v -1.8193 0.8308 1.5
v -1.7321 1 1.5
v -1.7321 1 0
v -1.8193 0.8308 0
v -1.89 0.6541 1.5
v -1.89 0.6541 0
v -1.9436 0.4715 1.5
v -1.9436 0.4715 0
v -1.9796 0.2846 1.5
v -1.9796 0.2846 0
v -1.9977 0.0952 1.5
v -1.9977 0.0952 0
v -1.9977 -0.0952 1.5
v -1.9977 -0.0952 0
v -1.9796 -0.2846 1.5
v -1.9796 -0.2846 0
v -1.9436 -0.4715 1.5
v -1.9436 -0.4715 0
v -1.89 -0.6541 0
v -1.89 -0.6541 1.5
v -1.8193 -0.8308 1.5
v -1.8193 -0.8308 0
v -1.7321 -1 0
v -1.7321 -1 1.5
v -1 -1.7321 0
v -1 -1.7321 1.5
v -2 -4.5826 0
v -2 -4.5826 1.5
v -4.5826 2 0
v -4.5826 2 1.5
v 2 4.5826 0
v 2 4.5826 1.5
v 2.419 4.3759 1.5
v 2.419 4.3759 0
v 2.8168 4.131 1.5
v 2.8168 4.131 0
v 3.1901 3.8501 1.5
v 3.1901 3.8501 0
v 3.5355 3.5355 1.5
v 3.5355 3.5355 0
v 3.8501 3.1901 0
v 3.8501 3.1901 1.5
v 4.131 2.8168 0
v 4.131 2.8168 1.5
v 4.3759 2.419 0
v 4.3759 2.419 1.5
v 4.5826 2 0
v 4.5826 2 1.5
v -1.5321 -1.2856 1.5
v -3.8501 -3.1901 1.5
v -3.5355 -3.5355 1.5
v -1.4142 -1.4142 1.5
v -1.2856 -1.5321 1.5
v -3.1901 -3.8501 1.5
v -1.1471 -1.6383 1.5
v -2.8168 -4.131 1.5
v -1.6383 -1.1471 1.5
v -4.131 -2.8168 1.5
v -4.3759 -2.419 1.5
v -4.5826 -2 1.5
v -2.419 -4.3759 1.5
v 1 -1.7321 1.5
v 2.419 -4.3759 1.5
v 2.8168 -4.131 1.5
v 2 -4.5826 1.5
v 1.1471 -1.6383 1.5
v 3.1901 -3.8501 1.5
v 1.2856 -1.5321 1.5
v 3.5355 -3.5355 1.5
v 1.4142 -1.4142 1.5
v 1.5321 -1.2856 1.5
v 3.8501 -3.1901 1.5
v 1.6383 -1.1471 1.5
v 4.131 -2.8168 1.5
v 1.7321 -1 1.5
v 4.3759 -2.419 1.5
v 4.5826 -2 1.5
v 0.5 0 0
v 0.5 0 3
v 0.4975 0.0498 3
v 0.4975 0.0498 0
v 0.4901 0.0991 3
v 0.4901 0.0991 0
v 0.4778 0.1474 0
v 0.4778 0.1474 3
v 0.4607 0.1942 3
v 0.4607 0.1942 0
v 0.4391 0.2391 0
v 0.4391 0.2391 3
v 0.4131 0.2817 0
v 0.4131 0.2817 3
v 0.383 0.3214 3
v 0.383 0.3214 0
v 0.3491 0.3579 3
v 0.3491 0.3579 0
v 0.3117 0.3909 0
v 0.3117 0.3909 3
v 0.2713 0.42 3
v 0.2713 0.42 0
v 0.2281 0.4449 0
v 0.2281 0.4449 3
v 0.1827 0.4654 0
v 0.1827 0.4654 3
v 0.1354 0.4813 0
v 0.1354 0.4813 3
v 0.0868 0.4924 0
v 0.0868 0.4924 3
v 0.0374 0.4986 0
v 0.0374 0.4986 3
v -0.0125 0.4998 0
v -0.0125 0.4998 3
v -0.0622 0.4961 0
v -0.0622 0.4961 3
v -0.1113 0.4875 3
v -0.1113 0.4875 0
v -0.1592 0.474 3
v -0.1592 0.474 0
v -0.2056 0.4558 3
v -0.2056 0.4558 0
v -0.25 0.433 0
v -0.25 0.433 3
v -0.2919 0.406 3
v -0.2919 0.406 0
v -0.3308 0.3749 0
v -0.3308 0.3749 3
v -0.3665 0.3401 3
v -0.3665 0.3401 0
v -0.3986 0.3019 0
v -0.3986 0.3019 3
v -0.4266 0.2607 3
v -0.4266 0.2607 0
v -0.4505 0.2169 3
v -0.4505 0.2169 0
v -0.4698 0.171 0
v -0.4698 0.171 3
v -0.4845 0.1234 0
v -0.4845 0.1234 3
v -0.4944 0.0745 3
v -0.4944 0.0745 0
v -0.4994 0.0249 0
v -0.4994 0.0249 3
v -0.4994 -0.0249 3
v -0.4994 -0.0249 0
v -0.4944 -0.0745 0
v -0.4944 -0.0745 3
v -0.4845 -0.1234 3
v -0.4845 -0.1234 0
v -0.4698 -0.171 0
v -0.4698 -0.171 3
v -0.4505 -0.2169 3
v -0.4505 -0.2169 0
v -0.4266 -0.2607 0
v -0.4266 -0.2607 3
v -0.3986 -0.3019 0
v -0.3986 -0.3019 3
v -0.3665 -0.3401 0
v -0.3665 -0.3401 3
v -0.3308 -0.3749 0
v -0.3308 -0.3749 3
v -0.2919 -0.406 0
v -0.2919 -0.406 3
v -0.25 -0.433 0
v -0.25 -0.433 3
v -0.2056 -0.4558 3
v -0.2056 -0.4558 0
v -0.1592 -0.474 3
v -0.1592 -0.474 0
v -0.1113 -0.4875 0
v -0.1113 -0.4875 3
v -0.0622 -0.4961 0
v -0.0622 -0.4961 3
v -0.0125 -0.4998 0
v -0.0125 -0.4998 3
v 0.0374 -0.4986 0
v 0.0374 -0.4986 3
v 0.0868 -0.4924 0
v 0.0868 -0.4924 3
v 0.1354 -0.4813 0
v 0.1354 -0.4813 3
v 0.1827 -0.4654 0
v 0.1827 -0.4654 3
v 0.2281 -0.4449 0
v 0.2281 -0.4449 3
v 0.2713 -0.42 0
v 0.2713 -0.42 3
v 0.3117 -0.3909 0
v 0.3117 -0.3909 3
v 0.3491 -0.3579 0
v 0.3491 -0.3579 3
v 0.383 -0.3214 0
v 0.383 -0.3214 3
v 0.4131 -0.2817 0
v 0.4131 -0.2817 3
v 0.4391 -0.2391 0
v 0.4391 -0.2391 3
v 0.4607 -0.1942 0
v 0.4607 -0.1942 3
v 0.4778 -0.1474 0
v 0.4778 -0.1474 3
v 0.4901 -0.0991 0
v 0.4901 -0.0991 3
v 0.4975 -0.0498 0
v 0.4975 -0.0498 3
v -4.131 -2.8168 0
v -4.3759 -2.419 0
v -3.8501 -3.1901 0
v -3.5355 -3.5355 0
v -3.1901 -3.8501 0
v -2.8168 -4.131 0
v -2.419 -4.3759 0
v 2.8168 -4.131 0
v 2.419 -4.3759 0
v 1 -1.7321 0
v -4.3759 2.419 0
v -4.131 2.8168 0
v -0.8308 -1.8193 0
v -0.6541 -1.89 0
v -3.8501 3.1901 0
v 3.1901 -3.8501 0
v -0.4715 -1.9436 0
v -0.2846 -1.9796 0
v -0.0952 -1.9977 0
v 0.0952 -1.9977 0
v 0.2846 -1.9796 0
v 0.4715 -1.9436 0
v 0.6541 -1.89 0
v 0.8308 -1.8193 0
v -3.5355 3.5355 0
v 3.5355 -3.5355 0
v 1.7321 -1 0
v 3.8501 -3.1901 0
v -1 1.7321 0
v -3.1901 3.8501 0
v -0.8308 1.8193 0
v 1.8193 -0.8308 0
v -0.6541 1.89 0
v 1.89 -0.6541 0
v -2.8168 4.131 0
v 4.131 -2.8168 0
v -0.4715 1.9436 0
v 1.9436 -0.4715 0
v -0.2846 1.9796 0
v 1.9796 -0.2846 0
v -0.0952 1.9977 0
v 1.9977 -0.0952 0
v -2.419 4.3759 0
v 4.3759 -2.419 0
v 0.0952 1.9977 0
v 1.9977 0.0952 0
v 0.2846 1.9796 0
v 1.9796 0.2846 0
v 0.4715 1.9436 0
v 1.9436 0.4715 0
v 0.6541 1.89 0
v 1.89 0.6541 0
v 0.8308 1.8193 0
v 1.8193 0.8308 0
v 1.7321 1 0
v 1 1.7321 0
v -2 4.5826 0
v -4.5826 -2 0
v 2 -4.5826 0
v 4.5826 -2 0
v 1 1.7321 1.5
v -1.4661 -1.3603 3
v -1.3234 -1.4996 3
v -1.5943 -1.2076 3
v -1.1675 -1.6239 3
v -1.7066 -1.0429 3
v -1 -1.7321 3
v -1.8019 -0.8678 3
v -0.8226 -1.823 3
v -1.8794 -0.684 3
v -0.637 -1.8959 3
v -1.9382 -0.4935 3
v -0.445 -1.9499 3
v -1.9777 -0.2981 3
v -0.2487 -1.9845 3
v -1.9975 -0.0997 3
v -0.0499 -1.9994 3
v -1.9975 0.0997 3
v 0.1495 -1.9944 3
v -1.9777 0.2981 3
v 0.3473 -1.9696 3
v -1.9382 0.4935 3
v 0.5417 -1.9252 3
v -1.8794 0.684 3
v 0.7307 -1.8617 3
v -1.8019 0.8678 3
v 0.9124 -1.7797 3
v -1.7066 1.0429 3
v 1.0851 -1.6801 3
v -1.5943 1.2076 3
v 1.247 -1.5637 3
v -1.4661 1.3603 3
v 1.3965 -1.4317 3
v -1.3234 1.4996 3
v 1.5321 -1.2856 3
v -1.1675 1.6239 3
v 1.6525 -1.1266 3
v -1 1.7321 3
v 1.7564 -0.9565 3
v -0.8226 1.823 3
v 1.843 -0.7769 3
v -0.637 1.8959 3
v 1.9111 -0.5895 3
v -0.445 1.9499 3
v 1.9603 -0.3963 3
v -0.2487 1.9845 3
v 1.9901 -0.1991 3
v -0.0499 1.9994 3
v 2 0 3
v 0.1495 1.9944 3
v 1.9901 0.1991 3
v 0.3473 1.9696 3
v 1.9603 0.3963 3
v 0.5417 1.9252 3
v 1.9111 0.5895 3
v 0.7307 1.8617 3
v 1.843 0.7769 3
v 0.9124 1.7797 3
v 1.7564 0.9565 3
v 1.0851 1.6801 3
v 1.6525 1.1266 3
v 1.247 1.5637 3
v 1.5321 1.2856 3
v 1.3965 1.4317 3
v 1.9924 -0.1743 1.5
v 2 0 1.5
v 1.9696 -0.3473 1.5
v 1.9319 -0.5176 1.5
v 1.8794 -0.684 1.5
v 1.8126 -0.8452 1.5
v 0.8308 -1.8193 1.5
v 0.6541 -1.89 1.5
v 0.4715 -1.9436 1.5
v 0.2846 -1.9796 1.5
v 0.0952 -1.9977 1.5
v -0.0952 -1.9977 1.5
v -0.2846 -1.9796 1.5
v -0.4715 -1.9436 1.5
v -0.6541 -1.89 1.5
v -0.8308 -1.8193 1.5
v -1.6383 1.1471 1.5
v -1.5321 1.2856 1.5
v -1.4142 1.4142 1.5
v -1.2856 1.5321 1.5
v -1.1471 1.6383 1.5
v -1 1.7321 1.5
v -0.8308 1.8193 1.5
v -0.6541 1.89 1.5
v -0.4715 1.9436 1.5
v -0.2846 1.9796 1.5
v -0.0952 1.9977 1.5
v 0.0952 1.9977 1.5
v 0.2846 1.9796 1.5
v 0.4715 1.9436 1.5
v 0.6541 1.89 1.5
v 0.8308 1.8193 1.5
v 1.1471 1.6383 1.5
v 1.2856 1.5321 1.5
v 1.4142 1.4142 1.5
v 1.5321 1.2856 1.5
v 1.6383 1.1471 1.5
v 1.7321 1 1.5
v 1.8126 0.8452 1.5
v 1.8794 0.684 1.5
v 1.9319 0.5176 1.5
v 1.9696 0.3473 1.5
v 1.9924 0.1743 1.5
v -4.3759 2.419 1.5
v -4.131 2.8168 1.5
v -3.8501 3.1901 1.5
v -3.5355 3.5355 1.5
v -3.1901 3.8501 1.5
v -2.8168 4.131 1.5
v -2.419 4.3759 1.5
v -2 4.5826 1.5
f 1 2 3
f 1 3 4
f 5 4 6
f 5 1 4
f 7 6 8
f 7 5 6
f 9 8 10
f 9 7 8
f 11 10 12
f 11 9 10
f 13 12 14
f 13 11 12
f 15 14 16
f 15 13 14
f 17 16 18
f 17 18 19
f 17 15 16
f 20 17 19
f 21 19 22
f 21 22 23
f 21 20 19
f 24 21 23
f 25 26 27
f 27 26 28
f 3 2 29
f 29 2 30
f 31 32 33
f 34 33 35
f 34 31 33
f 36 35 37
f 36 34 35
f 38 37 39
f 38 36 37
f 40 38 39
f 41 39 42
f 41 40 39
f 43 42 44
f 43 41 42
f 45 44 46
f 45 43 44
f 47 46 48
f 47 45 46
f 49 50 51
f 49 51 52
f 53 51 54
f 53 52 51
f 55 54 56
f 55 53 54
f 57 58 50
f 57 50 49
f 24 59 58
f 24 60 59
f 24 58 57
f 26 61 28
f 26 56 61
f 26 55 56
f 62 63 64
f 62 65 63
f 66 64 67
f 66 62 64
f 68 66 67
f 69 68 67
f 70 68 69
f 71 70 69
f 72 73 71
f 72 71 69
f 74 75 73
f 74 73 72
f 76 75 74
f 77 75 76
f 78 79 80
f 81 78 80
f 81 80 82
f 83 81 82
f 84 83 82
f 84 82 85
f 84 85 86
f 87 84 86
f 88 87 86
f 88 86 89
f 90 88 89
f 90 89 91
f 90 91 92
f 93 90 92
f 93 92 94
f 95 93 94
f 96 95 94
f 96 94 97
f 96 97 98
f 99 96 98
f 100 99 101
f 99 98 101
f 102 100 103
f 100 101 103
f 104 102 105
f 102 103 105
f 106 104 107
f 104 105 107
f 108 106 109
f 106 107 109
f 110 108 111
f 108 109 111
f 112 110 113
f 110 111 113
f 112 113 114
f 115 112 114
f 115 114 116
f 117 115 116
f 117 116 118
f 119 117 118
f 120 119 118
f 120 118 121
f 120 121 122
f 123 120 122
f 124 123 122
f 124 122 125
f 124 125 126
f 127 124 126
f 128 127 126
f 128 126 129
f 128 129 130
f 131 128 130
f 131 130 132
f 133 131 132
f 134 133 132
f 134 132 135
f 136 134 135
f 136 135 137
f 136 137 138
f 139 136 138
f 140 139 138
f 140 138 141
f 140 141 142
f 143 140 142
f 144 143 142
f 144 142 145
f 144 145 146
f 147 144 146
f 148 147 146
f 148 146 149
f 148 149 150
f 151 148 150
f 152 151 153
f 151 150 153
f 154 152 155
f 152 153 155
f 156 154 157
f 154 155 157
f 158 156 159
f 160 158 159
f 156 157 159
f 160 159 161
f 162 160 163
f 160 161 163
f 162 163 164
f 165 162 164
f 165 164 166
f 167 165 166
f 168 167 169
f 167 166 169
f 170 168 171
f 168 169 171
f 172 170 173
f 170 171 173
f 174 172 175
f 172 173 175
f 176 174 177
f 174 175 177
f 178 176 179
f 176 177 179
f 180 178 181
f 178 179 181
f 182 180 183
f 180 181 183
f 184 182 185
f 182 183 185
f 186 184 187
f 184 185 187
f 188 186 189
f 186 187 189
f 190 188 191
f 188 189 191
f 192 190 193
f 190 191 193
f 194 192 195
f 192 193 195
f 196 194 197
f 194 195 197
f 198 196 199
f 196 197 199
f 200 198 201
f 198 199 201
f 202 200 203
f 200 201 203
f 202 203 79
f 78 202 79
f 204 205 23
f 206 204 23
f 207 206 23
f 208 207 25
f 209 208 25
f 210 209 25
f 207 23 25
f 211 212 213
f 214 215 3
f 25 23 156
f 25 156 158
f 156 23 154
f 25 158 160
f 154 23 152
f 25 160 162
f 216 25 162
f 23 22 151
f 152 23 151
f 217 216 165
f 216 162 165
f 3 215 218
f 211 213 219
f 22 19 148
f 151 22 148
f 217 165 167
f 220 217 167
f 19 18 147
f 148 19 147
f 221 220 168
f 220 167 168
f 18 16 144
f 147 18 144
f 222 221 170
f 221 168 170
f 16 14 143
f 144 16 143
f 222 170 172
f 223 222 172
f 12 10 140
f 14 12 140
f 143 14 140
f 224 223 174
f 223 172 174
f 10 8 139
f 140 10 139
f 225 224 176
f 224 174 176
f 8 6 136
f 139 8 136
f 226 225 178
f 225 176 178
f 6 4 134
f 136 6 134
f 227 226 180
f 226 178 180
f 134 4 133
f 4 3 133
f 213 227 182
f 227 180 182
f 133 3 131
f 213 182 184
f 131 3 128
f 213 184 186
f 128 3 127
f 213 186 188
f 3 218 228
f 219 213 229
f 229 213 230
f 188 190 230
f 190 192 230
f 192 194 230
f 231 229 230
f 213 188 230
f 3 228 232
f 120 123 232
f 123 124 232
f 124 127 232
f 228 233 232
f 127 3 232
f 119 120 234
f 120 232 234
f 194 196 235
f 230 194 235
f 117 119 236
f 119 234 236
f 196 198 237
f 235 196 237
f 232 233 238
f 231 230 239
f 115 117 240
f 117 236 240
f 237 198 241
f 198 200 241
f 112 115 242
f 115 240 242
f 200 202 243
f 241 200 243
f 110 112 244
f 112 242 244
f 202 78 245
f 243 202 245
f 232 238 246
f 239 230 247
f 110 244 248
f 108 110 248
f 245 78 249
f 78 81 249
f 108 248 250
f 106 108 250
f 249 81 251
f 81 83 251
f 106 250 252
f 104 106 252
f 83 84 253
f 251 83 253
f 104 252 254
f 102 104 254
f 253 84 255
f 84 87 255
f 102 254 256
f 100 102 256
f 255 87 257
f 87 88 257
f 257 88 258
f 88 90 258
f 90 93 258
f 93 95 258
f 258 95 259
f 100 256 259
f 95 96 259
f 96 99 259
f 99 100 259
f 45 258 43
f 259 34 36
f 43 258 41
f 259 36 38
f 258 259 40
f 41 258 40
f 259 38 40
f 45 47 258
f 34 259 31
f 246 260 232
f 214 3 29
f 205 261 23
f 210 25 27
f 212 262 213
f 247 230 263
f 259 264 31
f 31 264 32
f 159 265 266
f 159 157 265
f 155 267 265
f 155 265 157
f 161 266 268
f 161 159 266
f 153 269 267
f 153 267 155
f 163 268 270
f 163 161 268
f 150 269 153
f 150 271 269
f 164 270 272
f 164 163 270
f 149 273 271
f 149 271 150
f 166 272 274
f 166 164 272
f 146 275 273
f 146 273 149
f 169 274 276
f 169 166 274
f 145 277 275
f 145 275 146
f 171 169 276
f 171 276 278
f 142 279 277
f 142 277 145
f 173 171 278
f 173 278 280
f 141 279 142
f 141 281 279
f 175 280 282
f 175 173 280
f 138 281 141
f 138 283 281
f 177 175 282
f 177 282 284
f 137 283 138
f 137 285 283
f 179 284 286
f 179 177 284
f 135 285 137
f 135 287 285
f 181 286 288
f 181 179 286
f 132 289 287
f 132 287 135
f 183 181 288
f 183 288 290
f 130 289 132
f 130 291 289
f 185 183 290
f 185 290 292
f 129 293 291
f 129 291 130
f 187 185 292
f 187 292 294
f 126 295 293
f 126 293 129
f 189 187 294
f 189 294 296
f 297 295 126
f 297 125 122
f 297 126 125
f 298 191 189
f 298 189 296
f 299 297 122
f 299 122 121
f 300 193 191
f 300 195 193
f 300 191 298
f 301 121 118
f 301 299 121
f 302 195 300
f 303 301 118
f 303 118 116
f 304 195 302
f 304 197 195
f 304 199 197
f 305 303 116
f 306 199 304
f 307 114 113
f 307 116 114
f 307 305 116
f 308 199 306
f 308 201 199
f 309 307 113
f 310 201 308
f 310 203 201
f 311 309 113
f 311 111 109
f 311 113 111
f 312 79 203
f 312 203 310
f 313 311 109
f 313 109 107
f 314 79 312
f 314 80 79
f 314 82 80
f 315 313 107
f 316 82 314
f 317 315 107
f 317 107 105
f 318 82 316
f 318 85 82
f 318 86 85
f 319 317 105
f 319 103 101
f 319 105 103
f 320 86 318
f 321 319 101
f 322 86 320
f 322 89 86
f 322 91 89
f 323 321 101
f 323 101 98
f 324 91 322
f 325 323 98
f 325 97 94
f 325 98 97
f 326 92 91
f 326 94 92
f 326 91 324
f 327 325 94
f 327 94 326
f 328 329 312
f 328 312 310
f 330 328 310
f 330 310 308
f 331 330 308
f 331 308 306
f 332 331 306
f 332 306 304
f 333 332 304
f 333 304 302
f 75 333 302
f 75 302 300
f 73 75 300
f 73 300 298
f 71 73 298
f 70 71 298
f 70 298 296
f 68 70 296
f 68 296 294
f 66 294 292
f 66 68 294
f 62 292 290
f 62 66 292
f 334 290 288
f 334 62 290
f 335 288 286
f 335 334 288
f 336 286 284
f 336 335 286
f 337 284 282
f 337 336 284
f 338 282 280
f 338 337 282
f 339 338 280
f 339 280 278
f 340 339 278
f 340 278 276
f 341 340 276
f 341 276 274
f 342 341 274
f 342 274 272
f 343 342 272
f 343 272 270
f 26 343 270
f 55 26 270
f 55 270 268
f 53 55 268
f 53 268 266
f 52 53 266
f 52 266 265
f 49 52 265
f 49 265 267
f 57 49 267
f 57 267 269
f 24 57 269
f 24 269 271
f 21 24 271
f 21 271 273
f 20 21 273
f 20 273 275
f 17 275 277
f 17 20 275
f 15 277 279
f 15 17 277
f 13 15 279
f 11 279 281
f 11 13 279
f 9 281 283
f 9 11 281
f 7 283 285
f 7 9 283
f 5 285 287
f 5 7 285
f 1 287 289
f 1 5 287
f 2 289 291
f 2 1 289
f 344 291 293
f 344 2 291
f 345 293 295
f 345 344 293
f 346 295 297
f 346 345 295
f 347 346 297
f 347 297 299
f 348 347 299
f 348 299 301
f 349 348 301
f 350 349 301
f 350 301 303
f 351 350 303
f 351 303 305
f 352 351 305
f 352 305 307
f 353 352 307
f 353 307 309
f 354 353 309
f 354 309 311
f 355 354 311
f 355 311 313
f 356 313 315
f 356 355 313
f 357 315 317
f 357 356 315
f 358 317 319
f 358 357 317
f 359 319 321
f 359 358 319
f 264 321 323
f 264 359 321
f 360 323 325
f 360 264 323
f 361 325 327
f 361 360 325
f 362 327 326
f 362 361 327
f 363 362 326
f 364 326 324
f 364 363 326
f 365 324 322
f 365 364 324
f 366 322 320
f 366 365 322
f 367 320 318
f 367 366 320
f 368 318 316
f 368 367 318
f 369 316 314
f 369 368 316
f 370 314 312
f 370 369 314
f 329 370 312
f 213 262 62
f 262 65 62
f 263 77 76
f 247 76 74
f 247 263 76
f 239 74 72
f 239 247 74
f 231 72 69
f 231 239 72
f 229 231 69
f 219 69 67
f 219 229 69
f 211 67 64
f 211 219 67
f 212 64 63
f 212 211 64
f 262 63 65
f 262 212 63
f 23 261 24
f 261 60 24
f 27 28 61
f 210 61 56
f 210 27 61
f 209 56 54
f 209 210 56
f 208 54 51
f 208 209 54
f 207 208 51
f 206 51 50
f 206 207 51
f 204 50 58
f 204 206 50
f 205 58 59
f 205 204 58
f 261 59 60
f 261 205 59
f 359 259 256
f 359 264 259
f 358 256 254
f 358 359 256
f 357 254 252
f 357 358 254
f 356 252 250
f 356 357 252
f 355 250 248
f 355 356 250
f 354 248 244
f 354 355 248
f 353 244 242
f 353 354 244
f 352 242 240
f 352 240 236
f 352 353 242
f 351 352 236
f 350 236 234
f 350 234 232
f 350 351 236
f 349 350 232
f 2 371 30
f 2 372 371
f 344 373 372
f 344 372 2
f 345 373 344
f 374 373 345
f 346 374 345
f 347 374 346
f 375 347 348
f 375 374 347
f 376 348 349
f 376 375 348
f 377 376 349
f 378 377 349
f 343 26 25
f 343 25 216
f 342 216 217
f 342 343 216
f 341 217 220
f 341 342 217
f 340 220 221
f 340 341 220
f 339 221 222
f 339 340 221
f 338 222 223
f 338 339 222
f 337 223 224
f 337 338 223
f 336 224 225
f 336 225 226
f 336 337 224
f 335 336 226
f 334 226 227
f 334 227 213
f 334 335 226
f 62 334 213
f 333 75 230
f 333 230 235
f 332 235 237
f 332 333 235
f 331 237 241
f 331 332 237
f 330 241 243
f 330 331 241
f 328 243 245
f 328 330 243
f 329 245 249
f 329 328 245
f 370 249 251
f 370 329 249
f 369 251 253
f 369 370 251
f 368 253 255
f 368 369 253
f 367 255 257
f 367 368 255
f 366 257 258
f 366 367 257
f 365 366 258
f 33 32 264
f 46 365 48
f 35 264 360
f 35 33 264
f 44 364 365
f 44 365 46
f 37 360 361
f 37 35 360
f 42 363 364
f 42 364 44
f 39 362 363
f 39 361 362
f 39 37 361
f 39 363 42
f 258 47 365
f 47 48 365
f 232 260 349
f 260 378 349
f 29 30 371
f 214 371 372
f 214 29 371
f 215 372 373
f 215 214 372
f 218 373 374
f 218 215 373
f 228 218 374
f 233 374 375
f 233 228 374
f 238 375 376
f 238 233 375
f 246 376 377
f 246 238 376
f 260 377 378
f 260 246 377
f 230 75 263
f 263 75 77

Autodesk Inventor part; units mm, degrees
ref_plane "YZ Plane" through (0, 0, 0) normal (1, 0, 0) x (0, 1, 0)
ref_plane "XZ Plane" through (0, 0, 0) normal (0, 1, 0) x (-1, 0, 0)
ref_plane "XY Plane" through (0, 0, 0) normal (0, 0, 1) x (1, 0, 0)
sketch "Esquisse1" plane through (0, 0, 0) normal (0, 0, 1) x (1, 0, 0)
  circle A0 centre (0, 0) radius 5
  dimension "d0" = 10
extrude "Extrusion1" add sketch "Esquisse1" along normal blind 1.5
sketch "Esquisse2" plane through (0, 0, 1.5) normal (0, 0, 1) x (1, 0, 0)
  circle A0 centre (0, 0) radius 5 projected
  circle A1 centre (0, 0) radius 2
  dimension "d3" = 4
extrude "Extrusion2" add sketch "Esquisse2" along normal blind 1.5 contours A1
sketch "Esquisse3" plane through (0, 0, 1.5) normal (0, 0, 1) x (1, 0, 0)
  circle A0 centre (0, 0) radius 2 projected
  circle A1 centre (0, 0) radius 5 projected
  line L0 (-2, 4.5826) -> (-1, 1.7321)
  line L1 (1, 1.7321) -> (2, 4.5826)
  arc A2 (1, 1.7321) -> (-1, 1.7321) centre (0, 0) ccw
  arc A3 (2, 4.5826) -> (-2, 4.5826) centre (0, 0) ccw
extrude "Extrusion3" cut sketch "Esquisse3" against normal through all contours A0 L0 A1 L1 picked at (1.2132, 3.7931)
pattern_circular "Réseau circulaire1" count 4 over 360 about axis through (0, 0, 1.5) along (0, 0, 1) of "Extrusion3"
sketch "Esquisse4" plane through (0, 0, 3) normal (0, 0, 1) x (1, 0, 0)
  circle A0 centre (0, 0) radius 2 projected
  circle A1 centre (0, 0) radius 0.5
  dimension "d11" = 1
extrude "Extrusion4" cut sketch "Esquisse4" against normal through all contours A1
properties part number "helice encodeur" material "Plastique ABS"
